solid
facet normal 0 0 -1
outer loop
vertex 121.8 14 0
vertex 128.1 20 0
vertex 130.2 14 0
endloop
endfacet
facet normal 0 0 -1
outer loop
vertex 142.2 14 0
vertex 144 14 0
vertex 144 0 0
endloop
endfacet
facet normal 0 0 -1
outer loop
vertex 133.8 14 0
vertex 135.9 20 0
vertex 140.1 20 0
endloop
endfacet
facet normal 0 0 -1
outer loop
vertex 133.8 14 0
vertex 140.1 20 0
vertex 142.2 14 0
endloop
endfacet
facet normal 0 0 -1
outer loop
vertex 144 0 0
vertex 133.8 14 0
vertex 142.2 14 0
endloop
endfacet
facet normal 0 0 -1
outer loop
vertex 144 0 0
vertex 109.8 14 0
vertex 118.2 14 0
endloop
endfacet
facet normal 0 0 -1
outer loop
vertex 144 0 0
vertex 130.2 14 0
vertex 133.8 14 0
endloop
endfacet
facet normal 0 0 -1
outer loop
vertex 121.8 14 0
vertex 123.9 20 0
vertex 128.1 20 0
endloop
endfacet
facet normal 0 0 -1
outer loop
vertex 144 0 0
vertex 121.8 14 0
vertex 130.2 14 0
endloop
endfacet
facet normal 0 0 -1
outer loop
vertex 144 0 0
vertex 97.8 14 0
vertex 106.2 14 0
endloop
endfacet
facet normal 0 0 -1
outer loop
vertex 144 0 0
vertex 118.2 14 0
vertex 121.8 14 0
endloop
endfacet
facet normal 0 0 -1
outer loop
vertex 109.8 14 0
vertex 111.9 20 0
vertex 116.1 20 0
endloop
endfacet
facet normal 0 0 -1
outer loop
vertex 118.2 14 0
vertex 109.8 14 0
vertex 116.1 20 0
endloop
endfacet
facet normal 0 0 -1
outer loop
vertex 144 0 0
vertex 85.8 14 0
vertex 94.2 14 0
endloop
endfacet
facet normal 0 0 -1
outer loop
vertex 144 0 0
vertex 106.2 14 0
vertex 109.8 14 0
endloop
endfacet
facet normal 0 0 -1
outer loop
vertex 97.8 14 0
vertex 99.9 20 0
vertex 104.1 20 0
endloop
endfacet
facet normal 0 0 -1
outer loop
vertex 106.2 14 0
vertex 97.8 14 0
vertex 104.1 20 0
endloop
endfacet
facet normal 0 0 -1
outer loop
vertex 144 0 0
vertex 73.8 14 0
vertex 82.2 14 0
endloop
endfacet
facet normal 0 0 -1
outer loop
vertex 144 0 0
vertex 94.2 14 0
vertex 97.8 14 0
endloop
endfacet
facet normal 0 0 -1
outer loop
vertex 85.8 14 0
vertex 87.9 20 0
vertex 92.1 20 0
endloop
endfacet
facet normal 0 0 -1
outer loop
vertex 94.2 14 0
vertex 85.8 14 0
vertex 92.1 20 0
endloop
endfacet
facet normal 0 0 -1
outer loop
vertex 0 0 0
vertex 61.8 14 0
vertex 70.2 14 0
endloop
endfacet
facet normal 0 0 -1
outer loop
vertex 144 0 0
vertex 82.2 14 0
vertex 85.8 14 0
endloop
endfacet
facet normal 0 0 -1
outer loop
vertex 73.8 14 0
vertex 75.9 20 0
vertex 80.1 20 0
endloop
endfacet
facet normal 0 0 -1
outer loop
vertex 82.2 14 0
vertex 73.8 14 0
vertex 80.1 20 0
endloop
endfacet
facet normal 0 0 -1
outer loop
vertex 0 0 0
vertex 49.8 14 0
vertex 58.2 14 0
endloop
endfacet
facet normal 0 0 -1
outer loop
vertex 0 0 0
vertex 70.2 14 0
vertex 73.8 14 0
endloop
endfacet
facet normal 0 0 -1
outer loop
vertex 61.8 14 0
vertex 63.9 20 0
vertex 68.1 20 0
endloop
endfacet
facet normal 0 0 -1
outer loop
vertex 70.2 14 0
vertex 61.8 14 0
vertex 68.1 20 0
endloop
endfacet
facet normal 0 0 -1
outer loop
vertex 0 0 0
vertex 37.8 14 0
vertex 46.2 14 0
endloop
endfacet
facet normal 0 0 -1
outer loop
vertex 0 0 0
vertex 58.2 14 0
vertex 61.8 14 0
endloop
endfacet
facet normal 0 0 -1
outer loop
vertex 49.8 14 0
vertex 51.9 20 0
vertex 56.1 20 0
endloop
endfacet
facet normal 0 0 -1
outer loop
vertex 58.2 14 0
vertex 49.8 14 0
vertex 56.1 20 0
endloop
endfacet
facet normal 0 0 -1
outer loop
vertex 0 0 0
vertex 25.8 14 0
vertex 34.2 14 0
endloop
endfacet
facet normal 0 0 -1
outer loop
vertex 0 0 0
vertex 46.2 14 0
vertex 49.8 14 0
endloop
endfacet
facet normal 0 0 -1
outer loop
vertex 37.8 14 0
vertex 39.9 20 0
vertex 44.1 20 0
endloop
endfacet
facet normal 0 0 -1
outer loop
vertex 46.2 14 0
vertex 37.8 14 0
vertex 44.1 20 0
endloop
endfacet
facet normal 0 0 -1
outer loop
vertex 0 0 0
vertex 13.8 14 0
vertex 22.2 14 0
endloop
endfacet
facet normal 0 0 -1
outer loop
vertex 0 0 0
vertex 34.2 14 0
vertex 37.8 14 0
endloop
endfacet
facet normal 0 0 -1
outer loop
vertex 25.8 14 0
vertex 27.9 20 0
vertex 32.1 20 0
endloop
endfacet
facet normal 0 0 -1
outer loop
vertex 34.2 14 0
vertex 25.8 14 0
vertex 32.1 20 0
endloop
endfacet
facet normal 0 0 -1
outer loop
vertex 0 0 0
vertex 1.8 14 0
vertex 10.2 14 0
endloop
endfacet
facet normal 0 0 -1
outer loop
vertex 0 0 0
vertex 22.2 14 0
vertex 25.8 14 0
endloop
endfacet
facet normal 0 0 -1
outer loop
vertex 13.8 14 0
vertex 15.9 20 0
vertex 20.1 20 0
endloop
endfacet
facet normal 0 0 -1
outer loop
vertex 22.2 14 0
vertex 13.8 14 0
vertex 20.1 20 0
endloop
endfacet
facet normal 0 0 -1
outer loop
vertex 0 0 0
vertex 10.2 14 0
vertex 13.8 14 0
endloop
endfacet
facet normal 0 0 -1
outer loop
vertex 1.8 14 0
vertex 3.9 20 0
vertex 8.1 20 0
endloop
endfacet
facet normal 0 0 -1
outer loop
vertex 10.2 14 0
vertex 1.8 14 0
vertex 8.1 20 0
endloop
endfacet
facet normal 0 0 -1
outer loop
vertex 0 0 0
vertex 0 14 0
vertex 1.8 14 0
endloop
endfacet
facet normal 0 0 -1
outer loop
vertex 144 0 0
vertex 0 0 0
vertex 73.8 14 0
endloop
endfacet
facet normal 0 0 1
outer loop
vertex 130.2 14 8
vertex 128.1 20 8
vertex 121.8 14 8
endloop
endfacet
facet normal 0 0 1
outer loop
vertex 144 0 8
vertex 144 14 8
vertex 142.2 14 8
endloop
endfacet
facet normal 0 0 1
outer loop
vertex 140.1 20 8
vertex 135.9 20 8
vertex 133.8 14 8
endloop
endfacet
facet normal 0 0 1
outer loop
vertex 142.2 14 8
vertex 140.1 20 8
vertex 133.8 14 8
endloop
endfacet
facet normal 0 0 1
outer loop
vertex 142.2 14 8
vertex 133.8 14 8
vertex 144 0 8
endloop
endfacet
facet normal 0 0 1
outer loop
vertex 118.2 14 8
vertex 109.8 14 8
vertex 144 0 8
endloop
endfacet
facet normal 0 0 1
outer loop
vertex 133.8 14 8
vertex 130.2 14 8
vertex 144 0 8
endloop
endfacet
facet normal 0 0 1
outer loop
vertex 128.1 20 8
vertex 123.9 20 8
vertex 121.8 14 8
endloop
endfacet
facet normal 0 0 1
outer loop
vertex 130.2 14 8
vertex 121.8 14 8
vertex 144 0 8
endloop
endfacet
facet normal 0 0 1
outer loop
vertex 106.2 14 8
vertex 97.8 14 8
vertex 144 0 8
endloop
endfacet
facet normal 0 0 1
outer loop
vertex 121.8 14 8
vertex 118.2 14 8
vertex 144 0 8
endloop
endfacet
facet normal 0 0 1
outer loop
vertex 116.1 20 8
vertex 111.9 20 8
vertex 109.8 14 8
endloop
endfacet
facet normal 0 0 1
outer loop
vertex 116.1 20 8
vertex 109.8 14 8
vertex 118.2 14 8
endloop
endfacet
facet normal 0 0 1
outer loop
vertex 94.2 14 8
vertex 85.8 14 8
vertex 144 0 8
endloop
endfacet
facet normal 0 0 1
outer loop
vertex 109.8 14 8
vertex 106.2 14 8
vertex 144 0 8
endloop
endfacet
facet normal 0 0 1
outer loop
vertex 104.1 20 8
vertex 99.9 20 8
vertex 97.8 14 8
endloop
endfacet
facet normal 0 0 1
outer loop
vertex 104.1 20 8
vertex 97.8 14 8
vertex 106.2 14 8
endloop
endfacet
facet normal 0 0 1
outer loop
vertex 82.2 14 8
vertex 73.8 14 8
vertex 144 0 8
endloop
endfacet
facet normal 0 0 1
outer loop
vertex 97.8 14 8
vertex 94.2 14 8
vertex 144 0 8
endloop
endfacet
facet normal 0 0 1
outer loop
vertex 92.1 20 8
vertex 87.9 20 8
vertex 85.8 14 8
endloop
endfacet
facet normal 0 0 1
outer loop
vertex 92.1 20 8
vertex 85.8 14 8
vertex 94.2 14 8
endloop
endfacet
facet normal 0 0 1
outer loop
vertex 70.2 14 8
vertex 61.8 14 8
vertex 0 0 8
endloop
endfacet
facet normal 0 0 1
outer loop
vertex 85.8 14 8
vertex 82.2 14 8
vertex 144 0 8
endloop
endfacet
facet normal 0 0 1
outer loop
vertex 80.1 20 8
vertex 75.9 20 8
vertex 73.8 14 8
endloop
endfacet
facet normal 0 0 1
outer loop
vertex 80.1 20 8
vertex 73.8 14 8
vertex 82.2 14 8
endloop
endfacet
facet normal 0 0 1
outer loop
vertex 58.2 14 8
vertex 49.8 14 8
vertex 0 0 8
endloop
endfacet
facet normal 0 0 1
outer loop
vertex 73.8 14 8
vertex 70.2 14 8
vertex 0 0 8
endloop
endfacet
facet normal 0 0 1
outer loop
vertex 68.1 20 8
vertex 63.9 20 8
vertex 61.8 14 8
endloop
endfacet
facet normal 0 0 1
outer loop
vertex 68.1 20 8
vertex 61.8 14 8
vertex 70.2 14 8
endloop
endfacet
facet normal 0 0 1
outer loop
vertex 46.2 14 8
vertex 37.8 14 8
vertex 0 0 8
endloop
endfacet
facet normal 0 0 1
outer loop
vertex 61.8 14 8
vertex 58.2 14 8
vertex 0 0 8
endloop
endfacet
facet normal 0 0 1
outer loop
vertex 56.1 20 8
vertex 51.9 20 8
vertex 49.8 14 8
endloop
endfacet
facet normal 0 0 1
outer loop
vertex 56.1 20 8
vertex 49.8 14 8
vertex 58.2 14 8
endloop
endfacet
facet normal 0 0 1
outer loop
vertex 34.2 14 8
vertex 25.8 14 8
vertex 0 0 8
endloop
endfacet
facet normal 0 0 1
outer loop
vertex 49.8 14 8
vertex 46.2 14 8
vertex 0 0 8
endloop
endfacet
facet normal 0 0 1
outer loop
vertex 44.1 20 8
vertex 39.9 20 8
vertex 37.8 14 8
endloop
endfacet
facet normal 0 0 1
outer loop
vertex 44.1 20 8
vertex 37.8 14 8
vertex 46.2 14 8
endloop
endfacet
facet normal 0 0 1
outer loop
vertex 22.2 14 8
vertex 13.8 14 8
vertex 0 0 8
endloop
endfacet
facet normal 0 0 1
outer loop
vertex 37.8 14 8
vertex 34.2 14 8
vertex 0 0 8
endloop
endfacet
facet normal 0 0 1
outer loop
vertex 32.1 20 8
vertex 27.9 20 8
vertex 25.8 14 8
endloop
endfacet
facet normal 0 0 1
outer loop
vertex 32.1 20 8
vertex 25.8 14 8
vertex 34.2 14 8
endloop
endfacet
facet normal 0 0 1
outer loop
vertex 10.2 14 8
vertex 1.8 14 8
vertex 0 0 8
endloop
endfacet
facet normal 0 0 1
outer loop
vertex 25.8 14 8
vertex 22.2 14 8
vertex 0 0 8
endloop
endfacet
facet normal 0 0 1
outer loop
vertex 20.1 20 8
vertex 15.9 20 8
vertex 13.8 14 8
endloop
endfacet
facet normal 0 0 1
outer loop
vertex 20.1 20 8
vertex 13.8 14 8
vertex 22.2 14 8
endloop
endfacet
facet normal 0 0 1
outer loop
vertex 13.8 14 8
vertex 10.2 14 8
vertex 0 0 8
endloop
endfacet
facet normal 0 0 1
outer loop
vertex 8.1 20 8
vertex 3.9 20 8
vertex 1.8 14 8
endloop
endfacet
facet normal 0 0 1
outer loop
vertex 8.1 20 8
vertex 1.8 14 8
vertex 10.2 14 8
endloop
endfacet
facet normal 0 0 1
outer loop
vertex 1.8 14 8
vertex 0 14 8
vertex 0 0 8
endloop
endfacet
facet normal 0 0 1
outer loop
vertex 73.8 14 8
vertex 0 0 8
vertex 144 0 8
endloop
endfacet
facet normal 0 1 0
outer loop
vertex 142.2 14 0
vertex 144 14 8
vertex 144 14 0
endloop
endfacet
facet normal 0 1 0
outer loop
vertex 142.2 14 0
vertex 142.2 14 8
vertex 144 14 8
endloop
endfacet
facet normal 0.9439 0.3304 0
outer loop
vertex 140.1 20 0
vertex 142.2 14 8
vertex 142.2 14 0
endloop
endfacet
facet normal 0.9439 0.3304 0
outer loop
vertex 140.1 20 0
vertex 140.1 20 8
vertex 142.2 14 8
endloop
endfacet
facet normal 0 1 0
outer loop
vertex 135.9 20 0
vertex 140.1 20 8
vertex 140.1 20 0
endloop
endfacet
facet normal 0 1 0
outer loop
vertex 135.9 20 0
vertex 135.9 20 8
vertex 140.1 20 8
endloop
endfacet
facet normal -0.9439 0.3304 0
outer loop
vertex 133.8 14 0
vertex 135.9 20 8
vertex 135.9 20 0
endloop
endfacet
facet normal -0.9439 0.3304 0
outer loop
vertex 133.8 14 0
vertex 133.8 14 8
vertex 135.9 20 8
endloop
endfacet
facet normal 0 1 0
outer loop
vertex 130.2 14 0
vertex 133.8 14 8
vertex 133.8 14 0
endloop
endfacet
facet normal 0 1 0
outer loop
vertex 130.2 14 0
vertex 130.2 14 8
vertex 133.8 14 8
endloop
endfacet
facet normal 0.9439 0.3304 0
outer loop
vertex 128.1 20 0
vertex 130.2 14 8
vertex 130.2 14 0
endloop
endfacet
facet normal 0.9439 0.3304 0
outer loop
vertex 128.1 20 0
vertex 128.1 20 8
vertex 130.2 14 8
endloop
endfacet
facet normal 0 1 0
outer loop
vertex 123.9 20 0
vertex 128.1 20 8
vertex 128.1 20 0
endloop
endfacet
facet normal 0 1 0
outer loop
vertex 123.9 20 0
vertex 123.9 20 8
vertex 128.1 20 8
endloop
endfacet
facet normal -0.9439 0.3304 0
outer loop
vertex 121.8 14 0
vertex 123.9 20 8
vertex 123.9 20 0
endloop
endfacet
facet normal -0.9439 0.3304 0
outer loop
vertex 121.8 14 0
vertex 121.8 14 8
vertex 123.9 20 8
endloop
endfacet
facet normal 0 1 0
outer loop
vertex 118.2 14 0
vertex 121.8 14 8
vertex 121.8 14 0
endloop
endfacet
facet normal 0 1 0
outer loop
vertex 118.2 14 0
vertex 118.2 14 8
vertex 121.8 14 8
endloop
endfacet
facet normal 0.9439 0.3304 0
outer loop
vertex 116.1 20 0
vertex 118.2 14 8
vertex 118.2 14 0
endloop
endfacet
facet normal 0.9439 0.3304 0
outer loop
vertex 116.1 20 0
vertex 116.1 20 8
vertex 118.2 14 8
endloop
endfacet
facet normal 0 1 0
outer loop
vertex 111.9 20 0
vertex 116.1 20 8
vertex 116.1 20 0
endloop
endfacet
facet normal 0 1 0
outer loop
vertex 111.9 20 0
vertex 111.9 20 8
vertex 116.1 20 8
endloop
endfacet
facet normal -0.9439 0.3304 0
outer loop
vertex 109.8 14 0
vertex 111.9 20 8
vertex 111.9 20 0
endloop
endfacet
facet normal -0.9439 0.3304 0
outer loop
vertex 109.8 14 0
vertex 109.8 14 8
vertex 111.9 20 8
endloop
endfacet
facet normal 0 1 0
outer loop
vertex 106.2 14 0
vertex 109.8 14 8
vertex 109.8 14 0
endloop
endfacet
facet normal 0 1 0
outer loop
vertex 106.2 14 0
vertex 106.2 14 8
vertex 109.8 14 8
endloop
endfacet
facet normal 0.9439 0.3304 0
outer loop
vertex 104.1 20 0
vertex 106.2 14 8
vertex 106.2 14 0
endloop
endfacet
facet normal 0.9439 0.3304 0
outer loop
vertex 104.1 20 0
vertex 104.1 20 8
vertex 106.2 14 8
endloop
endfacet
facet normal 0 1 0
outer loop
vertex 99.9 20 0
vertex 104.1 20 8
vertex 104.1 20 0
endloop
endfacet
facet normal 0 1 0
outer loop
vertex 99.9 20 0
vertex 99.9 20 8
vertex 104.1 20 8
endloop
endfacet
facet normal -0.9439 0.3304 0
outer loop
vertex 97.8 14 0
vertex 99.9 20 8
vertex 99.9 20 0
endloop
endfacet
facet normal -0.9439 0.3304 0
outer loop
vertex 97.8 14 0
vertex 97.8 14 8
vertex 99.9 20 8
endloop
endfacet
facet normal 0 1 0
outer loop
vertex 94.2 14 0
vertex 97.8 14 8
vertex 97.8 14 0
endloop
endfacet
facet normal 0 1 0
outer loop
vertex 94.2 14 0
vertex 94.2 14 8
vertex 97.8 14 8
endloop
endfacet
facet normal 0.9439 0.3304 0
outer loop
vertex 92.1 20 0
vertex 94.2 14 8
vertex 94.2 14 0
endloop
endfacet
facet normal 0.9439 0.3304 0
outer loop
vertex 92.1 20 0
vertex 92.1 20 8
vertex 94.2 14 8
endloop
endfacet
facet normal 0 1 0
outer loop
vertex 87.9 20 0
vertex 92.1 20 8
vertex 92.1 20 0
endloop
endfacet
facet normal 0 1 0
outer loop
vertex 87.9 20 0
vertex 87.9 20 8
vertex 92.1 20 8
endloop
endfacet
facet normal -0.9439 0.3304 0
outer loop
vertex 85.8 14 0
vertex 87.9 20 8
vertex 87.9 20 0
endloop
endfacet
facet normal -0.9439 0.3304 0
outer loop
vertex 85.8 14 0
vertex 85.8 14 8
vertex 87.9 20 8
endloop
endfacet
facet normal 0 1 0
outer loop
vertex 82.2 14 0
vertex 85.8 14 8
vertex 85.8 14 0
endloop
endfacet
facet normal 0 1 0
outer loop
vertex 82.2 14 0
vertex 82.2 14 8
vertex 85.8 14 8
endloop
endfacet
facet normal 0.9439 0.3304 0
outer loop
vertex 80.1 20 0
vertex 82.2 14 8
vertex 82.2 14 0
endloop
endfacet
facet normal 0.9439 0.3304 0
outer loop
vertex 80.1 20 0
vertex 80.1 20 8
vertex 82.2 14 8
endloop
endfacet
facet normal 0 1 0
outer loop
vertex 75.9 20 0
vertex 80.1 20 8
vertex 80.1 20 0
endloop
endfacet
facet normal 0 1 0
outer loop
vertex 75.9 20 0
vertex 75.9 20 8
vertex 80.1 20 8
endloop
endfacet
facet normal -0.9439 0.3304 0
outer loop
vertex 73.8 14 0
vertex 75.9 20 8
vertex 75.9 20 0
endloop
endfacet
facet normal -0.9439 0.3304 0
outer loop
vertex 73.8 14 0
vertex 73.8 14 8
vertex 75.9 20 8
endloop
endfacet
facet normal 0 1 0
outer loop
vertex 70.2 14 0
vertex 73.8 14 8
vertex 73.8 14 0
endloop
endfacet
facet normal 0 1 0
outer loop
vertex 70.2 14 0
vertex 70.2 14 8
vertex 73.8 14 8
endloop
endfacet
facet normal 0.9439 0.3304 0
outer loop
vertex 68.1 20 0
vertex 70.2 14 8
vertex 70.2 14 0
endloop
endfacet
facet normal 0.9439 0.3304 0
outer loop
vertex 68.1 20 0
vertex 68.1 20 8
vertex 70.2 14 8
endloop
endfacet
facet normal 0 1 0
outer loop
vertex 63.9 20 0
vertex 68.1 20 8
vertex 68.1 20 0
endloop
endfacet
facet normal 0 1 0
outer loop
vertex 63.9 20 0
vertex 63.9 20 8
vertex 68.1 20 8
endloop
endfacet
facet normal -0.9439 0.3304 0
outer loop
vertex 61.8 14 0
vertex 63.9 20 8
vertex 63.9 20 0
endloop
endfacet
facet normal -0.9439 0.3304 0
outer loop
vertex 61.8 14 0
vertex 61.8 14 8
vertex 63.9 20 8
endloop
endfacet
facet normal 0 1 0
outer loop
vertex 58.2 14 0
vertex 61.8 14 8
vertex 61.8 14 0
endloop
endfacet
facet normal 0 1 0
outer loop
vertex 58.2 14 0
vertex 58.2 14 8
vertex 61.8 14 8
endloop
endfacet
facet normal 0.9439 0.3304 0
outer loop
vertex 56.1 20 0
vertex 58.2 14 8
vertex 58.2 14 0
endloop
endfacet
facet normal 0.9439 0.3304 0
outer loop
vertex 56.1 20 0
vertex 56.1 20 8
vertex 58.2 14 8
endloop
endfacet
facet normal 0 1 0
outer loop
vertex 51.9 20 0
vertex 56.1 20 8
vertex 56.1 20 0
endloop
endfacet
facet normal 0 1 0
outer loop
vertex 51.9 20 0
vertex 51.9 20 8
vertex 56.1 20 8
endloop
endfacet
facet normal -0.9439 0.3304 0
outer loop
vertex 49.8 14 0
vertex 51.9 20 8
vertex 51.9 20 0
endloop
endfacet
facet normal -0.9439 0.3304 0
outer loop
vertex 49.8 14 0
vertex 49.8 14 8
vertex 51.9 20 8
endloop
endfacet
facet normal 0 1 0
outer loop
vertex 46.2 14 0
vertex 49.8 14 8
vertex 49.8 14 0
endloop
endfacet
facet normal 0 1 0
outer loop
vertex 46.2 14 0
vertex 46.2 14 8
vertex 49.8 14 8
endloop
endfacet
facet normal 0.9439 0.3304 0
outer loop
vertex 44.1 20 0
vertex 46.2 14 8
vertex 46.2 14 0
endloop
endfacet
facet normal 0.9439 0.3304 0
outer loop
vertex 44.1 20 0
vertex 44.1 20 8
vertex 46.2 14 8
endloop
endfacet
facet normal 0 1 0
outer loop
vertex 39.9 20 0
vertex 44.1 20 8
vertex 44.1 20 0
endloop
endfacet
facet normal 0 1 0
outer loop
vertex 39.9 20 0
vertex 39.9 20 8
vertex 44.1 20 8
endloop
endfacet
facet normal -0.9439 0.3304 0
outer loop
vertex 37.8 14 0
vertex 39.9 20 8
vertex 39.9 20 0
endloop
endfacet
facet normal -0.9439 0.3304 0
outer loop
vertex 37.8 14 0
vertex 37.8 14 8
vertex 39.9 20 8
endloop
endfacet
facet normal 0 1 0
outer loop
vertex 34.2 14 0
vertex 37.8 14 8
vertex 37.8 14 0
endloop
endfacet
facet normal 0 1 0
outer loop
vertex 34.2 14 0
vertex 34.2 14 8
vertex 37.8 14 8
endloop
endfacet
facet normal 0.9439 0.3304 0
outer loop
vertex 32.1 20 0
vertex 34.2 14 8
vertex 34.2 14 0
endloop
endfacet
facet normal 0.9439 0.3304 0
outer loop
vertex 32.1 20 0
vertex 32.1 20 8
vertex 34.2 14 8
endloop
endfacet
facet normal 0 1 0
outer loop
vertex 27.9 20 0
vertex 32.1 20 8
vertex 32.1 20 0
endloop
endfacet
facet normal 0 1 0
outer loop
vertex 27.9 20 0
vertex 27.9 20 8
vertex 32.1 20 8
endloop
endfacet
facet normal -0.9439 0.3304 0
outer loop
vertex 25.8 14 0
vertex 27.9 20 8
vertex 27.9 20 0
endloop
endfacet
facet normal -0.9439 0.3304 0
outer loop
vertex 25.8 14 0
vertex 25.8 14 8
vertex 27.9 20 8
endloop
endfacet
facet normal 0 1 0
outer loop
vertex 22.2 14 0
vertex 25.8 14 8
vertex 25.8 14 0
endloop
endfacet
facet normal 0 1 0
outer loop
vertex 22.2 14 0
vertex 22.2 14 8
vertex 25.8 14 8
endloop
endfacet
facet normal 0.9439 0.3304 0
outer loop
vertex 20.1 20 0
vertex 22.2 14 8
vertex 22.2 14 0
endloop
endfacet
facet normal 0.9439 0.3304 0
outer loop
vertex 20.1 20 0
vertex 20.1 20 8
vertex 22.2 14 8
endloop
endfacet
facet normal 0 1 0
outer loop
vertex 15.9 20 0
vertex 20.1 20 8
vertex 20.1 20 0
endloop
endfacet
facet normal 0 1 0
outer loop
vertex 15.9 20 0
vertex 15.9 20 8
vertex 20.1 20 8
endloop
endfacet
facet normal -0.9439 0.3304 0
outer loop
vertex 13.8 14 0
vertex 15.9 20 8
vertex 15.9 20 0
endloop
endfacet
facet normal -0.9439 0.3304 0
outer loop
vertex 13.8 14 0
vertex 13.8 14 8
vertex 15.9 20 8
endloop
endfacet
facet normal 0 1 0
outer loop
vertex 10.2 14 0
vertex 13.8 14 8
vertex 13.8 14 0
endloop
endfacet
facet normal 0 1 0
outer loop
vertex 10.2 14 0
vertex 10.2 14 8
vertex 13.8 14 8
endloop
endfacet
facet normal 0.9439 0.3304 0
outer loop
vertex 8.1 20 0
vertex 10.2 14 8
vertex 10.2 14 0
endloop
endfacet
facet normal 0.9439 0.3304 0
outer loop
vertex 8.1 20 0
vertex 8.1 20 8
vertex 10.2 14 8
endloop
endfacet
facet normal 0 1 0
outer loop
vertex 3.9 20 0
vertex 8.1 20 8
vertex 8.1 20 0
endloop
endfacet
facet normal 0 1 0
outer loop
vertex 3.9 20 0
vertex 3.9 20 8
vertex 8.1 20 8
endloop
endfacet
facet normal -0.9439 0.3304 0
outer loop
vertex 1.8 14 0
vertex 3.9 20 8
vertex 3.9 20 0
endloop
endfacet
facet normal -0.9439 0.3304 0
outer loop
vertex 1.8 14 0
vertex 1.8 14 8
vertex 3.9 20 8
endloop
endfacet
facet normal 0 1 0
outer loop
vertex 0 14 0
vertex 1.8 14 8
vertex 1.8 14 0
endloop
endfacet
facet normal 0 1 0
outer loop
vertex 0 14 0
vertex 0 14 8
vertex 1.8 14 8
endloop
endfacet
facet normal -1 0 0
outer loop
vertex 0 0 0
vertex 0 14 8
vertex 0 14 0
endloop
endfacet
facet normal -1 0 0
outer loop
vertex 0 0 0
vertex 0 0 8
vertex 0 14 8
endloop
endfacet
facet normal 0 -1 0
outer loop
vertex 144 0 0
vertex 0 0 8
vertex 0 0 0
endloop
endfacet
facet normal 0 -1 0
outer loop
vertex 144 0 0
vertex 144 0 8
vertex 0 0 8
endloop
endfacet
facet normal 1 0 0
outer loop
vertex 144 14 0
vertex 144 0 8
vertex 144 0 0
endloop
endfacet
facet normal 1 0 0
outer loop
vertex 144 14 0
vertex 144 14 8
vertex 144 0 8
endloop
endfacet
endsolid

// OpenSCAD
$fn = 32;

// ----------------------------------------------------------------------
// Gear rack: 12 teeth, pitch 12 mm
// ----------------------------------------------------------------------

// --- parameters (mm) ---
teeth = 12;               // number of teeth
pitch = 12;               // tooth pitch, X
root_w = 8.4;             // tooth width at the root
tip_w = 4.2;              // tooth width at the tip
base_h = 14;              // rack body height, Y
tooth_h = 6;              // tooth height above the body
plate_t = 8;              // rack width, Z (extrusion height)

rack_l = teeth * pitch;  // overall length
total_h = base_h + tooth_h;  // overall height

profile = [[0, 0], [144, 0], [144, 14], [142.2, 14], [140.1, 20], [135.9, 20], [133.8, 14], [130.2, 14], [128.1, 20], [123.9, 20], [121.8, 14], [118.2, 14], [116.1, 20], [111.9, 20], [109.8, 14], [106.2, 14], [104.1, 20], [99.9, 20], [97.8, 14], [94.2, 14], [92.1, 20], [87.9, 20], [85.8, 14], [82.2, 14], [80.1, 20], [75.9, 20], [73.8, 14], [70.2, 14], [68.1, 20], [63.9, 20], [61.8, 14], [58.2, 14], [56.1, 20], [51.9, 20], [49.8, 14], [46.2, 14], [44.1, 20], [39.9, 20], [37.8, 14], [34.2, 14], [32.1, 20], [27.9, 20], [25.8, 14], [22.2, 14], [20.1, 20], [15.9, 20], [13.8, 14], [10.2, 14], [8.1, 20], [3.9, 20], [1.8, 14], [0, 14]];  // primary outline, 52 points, counter clockwise

// --- the one profile operation ---
linear_extrude(height = plate_t) polygon(points = profile);
